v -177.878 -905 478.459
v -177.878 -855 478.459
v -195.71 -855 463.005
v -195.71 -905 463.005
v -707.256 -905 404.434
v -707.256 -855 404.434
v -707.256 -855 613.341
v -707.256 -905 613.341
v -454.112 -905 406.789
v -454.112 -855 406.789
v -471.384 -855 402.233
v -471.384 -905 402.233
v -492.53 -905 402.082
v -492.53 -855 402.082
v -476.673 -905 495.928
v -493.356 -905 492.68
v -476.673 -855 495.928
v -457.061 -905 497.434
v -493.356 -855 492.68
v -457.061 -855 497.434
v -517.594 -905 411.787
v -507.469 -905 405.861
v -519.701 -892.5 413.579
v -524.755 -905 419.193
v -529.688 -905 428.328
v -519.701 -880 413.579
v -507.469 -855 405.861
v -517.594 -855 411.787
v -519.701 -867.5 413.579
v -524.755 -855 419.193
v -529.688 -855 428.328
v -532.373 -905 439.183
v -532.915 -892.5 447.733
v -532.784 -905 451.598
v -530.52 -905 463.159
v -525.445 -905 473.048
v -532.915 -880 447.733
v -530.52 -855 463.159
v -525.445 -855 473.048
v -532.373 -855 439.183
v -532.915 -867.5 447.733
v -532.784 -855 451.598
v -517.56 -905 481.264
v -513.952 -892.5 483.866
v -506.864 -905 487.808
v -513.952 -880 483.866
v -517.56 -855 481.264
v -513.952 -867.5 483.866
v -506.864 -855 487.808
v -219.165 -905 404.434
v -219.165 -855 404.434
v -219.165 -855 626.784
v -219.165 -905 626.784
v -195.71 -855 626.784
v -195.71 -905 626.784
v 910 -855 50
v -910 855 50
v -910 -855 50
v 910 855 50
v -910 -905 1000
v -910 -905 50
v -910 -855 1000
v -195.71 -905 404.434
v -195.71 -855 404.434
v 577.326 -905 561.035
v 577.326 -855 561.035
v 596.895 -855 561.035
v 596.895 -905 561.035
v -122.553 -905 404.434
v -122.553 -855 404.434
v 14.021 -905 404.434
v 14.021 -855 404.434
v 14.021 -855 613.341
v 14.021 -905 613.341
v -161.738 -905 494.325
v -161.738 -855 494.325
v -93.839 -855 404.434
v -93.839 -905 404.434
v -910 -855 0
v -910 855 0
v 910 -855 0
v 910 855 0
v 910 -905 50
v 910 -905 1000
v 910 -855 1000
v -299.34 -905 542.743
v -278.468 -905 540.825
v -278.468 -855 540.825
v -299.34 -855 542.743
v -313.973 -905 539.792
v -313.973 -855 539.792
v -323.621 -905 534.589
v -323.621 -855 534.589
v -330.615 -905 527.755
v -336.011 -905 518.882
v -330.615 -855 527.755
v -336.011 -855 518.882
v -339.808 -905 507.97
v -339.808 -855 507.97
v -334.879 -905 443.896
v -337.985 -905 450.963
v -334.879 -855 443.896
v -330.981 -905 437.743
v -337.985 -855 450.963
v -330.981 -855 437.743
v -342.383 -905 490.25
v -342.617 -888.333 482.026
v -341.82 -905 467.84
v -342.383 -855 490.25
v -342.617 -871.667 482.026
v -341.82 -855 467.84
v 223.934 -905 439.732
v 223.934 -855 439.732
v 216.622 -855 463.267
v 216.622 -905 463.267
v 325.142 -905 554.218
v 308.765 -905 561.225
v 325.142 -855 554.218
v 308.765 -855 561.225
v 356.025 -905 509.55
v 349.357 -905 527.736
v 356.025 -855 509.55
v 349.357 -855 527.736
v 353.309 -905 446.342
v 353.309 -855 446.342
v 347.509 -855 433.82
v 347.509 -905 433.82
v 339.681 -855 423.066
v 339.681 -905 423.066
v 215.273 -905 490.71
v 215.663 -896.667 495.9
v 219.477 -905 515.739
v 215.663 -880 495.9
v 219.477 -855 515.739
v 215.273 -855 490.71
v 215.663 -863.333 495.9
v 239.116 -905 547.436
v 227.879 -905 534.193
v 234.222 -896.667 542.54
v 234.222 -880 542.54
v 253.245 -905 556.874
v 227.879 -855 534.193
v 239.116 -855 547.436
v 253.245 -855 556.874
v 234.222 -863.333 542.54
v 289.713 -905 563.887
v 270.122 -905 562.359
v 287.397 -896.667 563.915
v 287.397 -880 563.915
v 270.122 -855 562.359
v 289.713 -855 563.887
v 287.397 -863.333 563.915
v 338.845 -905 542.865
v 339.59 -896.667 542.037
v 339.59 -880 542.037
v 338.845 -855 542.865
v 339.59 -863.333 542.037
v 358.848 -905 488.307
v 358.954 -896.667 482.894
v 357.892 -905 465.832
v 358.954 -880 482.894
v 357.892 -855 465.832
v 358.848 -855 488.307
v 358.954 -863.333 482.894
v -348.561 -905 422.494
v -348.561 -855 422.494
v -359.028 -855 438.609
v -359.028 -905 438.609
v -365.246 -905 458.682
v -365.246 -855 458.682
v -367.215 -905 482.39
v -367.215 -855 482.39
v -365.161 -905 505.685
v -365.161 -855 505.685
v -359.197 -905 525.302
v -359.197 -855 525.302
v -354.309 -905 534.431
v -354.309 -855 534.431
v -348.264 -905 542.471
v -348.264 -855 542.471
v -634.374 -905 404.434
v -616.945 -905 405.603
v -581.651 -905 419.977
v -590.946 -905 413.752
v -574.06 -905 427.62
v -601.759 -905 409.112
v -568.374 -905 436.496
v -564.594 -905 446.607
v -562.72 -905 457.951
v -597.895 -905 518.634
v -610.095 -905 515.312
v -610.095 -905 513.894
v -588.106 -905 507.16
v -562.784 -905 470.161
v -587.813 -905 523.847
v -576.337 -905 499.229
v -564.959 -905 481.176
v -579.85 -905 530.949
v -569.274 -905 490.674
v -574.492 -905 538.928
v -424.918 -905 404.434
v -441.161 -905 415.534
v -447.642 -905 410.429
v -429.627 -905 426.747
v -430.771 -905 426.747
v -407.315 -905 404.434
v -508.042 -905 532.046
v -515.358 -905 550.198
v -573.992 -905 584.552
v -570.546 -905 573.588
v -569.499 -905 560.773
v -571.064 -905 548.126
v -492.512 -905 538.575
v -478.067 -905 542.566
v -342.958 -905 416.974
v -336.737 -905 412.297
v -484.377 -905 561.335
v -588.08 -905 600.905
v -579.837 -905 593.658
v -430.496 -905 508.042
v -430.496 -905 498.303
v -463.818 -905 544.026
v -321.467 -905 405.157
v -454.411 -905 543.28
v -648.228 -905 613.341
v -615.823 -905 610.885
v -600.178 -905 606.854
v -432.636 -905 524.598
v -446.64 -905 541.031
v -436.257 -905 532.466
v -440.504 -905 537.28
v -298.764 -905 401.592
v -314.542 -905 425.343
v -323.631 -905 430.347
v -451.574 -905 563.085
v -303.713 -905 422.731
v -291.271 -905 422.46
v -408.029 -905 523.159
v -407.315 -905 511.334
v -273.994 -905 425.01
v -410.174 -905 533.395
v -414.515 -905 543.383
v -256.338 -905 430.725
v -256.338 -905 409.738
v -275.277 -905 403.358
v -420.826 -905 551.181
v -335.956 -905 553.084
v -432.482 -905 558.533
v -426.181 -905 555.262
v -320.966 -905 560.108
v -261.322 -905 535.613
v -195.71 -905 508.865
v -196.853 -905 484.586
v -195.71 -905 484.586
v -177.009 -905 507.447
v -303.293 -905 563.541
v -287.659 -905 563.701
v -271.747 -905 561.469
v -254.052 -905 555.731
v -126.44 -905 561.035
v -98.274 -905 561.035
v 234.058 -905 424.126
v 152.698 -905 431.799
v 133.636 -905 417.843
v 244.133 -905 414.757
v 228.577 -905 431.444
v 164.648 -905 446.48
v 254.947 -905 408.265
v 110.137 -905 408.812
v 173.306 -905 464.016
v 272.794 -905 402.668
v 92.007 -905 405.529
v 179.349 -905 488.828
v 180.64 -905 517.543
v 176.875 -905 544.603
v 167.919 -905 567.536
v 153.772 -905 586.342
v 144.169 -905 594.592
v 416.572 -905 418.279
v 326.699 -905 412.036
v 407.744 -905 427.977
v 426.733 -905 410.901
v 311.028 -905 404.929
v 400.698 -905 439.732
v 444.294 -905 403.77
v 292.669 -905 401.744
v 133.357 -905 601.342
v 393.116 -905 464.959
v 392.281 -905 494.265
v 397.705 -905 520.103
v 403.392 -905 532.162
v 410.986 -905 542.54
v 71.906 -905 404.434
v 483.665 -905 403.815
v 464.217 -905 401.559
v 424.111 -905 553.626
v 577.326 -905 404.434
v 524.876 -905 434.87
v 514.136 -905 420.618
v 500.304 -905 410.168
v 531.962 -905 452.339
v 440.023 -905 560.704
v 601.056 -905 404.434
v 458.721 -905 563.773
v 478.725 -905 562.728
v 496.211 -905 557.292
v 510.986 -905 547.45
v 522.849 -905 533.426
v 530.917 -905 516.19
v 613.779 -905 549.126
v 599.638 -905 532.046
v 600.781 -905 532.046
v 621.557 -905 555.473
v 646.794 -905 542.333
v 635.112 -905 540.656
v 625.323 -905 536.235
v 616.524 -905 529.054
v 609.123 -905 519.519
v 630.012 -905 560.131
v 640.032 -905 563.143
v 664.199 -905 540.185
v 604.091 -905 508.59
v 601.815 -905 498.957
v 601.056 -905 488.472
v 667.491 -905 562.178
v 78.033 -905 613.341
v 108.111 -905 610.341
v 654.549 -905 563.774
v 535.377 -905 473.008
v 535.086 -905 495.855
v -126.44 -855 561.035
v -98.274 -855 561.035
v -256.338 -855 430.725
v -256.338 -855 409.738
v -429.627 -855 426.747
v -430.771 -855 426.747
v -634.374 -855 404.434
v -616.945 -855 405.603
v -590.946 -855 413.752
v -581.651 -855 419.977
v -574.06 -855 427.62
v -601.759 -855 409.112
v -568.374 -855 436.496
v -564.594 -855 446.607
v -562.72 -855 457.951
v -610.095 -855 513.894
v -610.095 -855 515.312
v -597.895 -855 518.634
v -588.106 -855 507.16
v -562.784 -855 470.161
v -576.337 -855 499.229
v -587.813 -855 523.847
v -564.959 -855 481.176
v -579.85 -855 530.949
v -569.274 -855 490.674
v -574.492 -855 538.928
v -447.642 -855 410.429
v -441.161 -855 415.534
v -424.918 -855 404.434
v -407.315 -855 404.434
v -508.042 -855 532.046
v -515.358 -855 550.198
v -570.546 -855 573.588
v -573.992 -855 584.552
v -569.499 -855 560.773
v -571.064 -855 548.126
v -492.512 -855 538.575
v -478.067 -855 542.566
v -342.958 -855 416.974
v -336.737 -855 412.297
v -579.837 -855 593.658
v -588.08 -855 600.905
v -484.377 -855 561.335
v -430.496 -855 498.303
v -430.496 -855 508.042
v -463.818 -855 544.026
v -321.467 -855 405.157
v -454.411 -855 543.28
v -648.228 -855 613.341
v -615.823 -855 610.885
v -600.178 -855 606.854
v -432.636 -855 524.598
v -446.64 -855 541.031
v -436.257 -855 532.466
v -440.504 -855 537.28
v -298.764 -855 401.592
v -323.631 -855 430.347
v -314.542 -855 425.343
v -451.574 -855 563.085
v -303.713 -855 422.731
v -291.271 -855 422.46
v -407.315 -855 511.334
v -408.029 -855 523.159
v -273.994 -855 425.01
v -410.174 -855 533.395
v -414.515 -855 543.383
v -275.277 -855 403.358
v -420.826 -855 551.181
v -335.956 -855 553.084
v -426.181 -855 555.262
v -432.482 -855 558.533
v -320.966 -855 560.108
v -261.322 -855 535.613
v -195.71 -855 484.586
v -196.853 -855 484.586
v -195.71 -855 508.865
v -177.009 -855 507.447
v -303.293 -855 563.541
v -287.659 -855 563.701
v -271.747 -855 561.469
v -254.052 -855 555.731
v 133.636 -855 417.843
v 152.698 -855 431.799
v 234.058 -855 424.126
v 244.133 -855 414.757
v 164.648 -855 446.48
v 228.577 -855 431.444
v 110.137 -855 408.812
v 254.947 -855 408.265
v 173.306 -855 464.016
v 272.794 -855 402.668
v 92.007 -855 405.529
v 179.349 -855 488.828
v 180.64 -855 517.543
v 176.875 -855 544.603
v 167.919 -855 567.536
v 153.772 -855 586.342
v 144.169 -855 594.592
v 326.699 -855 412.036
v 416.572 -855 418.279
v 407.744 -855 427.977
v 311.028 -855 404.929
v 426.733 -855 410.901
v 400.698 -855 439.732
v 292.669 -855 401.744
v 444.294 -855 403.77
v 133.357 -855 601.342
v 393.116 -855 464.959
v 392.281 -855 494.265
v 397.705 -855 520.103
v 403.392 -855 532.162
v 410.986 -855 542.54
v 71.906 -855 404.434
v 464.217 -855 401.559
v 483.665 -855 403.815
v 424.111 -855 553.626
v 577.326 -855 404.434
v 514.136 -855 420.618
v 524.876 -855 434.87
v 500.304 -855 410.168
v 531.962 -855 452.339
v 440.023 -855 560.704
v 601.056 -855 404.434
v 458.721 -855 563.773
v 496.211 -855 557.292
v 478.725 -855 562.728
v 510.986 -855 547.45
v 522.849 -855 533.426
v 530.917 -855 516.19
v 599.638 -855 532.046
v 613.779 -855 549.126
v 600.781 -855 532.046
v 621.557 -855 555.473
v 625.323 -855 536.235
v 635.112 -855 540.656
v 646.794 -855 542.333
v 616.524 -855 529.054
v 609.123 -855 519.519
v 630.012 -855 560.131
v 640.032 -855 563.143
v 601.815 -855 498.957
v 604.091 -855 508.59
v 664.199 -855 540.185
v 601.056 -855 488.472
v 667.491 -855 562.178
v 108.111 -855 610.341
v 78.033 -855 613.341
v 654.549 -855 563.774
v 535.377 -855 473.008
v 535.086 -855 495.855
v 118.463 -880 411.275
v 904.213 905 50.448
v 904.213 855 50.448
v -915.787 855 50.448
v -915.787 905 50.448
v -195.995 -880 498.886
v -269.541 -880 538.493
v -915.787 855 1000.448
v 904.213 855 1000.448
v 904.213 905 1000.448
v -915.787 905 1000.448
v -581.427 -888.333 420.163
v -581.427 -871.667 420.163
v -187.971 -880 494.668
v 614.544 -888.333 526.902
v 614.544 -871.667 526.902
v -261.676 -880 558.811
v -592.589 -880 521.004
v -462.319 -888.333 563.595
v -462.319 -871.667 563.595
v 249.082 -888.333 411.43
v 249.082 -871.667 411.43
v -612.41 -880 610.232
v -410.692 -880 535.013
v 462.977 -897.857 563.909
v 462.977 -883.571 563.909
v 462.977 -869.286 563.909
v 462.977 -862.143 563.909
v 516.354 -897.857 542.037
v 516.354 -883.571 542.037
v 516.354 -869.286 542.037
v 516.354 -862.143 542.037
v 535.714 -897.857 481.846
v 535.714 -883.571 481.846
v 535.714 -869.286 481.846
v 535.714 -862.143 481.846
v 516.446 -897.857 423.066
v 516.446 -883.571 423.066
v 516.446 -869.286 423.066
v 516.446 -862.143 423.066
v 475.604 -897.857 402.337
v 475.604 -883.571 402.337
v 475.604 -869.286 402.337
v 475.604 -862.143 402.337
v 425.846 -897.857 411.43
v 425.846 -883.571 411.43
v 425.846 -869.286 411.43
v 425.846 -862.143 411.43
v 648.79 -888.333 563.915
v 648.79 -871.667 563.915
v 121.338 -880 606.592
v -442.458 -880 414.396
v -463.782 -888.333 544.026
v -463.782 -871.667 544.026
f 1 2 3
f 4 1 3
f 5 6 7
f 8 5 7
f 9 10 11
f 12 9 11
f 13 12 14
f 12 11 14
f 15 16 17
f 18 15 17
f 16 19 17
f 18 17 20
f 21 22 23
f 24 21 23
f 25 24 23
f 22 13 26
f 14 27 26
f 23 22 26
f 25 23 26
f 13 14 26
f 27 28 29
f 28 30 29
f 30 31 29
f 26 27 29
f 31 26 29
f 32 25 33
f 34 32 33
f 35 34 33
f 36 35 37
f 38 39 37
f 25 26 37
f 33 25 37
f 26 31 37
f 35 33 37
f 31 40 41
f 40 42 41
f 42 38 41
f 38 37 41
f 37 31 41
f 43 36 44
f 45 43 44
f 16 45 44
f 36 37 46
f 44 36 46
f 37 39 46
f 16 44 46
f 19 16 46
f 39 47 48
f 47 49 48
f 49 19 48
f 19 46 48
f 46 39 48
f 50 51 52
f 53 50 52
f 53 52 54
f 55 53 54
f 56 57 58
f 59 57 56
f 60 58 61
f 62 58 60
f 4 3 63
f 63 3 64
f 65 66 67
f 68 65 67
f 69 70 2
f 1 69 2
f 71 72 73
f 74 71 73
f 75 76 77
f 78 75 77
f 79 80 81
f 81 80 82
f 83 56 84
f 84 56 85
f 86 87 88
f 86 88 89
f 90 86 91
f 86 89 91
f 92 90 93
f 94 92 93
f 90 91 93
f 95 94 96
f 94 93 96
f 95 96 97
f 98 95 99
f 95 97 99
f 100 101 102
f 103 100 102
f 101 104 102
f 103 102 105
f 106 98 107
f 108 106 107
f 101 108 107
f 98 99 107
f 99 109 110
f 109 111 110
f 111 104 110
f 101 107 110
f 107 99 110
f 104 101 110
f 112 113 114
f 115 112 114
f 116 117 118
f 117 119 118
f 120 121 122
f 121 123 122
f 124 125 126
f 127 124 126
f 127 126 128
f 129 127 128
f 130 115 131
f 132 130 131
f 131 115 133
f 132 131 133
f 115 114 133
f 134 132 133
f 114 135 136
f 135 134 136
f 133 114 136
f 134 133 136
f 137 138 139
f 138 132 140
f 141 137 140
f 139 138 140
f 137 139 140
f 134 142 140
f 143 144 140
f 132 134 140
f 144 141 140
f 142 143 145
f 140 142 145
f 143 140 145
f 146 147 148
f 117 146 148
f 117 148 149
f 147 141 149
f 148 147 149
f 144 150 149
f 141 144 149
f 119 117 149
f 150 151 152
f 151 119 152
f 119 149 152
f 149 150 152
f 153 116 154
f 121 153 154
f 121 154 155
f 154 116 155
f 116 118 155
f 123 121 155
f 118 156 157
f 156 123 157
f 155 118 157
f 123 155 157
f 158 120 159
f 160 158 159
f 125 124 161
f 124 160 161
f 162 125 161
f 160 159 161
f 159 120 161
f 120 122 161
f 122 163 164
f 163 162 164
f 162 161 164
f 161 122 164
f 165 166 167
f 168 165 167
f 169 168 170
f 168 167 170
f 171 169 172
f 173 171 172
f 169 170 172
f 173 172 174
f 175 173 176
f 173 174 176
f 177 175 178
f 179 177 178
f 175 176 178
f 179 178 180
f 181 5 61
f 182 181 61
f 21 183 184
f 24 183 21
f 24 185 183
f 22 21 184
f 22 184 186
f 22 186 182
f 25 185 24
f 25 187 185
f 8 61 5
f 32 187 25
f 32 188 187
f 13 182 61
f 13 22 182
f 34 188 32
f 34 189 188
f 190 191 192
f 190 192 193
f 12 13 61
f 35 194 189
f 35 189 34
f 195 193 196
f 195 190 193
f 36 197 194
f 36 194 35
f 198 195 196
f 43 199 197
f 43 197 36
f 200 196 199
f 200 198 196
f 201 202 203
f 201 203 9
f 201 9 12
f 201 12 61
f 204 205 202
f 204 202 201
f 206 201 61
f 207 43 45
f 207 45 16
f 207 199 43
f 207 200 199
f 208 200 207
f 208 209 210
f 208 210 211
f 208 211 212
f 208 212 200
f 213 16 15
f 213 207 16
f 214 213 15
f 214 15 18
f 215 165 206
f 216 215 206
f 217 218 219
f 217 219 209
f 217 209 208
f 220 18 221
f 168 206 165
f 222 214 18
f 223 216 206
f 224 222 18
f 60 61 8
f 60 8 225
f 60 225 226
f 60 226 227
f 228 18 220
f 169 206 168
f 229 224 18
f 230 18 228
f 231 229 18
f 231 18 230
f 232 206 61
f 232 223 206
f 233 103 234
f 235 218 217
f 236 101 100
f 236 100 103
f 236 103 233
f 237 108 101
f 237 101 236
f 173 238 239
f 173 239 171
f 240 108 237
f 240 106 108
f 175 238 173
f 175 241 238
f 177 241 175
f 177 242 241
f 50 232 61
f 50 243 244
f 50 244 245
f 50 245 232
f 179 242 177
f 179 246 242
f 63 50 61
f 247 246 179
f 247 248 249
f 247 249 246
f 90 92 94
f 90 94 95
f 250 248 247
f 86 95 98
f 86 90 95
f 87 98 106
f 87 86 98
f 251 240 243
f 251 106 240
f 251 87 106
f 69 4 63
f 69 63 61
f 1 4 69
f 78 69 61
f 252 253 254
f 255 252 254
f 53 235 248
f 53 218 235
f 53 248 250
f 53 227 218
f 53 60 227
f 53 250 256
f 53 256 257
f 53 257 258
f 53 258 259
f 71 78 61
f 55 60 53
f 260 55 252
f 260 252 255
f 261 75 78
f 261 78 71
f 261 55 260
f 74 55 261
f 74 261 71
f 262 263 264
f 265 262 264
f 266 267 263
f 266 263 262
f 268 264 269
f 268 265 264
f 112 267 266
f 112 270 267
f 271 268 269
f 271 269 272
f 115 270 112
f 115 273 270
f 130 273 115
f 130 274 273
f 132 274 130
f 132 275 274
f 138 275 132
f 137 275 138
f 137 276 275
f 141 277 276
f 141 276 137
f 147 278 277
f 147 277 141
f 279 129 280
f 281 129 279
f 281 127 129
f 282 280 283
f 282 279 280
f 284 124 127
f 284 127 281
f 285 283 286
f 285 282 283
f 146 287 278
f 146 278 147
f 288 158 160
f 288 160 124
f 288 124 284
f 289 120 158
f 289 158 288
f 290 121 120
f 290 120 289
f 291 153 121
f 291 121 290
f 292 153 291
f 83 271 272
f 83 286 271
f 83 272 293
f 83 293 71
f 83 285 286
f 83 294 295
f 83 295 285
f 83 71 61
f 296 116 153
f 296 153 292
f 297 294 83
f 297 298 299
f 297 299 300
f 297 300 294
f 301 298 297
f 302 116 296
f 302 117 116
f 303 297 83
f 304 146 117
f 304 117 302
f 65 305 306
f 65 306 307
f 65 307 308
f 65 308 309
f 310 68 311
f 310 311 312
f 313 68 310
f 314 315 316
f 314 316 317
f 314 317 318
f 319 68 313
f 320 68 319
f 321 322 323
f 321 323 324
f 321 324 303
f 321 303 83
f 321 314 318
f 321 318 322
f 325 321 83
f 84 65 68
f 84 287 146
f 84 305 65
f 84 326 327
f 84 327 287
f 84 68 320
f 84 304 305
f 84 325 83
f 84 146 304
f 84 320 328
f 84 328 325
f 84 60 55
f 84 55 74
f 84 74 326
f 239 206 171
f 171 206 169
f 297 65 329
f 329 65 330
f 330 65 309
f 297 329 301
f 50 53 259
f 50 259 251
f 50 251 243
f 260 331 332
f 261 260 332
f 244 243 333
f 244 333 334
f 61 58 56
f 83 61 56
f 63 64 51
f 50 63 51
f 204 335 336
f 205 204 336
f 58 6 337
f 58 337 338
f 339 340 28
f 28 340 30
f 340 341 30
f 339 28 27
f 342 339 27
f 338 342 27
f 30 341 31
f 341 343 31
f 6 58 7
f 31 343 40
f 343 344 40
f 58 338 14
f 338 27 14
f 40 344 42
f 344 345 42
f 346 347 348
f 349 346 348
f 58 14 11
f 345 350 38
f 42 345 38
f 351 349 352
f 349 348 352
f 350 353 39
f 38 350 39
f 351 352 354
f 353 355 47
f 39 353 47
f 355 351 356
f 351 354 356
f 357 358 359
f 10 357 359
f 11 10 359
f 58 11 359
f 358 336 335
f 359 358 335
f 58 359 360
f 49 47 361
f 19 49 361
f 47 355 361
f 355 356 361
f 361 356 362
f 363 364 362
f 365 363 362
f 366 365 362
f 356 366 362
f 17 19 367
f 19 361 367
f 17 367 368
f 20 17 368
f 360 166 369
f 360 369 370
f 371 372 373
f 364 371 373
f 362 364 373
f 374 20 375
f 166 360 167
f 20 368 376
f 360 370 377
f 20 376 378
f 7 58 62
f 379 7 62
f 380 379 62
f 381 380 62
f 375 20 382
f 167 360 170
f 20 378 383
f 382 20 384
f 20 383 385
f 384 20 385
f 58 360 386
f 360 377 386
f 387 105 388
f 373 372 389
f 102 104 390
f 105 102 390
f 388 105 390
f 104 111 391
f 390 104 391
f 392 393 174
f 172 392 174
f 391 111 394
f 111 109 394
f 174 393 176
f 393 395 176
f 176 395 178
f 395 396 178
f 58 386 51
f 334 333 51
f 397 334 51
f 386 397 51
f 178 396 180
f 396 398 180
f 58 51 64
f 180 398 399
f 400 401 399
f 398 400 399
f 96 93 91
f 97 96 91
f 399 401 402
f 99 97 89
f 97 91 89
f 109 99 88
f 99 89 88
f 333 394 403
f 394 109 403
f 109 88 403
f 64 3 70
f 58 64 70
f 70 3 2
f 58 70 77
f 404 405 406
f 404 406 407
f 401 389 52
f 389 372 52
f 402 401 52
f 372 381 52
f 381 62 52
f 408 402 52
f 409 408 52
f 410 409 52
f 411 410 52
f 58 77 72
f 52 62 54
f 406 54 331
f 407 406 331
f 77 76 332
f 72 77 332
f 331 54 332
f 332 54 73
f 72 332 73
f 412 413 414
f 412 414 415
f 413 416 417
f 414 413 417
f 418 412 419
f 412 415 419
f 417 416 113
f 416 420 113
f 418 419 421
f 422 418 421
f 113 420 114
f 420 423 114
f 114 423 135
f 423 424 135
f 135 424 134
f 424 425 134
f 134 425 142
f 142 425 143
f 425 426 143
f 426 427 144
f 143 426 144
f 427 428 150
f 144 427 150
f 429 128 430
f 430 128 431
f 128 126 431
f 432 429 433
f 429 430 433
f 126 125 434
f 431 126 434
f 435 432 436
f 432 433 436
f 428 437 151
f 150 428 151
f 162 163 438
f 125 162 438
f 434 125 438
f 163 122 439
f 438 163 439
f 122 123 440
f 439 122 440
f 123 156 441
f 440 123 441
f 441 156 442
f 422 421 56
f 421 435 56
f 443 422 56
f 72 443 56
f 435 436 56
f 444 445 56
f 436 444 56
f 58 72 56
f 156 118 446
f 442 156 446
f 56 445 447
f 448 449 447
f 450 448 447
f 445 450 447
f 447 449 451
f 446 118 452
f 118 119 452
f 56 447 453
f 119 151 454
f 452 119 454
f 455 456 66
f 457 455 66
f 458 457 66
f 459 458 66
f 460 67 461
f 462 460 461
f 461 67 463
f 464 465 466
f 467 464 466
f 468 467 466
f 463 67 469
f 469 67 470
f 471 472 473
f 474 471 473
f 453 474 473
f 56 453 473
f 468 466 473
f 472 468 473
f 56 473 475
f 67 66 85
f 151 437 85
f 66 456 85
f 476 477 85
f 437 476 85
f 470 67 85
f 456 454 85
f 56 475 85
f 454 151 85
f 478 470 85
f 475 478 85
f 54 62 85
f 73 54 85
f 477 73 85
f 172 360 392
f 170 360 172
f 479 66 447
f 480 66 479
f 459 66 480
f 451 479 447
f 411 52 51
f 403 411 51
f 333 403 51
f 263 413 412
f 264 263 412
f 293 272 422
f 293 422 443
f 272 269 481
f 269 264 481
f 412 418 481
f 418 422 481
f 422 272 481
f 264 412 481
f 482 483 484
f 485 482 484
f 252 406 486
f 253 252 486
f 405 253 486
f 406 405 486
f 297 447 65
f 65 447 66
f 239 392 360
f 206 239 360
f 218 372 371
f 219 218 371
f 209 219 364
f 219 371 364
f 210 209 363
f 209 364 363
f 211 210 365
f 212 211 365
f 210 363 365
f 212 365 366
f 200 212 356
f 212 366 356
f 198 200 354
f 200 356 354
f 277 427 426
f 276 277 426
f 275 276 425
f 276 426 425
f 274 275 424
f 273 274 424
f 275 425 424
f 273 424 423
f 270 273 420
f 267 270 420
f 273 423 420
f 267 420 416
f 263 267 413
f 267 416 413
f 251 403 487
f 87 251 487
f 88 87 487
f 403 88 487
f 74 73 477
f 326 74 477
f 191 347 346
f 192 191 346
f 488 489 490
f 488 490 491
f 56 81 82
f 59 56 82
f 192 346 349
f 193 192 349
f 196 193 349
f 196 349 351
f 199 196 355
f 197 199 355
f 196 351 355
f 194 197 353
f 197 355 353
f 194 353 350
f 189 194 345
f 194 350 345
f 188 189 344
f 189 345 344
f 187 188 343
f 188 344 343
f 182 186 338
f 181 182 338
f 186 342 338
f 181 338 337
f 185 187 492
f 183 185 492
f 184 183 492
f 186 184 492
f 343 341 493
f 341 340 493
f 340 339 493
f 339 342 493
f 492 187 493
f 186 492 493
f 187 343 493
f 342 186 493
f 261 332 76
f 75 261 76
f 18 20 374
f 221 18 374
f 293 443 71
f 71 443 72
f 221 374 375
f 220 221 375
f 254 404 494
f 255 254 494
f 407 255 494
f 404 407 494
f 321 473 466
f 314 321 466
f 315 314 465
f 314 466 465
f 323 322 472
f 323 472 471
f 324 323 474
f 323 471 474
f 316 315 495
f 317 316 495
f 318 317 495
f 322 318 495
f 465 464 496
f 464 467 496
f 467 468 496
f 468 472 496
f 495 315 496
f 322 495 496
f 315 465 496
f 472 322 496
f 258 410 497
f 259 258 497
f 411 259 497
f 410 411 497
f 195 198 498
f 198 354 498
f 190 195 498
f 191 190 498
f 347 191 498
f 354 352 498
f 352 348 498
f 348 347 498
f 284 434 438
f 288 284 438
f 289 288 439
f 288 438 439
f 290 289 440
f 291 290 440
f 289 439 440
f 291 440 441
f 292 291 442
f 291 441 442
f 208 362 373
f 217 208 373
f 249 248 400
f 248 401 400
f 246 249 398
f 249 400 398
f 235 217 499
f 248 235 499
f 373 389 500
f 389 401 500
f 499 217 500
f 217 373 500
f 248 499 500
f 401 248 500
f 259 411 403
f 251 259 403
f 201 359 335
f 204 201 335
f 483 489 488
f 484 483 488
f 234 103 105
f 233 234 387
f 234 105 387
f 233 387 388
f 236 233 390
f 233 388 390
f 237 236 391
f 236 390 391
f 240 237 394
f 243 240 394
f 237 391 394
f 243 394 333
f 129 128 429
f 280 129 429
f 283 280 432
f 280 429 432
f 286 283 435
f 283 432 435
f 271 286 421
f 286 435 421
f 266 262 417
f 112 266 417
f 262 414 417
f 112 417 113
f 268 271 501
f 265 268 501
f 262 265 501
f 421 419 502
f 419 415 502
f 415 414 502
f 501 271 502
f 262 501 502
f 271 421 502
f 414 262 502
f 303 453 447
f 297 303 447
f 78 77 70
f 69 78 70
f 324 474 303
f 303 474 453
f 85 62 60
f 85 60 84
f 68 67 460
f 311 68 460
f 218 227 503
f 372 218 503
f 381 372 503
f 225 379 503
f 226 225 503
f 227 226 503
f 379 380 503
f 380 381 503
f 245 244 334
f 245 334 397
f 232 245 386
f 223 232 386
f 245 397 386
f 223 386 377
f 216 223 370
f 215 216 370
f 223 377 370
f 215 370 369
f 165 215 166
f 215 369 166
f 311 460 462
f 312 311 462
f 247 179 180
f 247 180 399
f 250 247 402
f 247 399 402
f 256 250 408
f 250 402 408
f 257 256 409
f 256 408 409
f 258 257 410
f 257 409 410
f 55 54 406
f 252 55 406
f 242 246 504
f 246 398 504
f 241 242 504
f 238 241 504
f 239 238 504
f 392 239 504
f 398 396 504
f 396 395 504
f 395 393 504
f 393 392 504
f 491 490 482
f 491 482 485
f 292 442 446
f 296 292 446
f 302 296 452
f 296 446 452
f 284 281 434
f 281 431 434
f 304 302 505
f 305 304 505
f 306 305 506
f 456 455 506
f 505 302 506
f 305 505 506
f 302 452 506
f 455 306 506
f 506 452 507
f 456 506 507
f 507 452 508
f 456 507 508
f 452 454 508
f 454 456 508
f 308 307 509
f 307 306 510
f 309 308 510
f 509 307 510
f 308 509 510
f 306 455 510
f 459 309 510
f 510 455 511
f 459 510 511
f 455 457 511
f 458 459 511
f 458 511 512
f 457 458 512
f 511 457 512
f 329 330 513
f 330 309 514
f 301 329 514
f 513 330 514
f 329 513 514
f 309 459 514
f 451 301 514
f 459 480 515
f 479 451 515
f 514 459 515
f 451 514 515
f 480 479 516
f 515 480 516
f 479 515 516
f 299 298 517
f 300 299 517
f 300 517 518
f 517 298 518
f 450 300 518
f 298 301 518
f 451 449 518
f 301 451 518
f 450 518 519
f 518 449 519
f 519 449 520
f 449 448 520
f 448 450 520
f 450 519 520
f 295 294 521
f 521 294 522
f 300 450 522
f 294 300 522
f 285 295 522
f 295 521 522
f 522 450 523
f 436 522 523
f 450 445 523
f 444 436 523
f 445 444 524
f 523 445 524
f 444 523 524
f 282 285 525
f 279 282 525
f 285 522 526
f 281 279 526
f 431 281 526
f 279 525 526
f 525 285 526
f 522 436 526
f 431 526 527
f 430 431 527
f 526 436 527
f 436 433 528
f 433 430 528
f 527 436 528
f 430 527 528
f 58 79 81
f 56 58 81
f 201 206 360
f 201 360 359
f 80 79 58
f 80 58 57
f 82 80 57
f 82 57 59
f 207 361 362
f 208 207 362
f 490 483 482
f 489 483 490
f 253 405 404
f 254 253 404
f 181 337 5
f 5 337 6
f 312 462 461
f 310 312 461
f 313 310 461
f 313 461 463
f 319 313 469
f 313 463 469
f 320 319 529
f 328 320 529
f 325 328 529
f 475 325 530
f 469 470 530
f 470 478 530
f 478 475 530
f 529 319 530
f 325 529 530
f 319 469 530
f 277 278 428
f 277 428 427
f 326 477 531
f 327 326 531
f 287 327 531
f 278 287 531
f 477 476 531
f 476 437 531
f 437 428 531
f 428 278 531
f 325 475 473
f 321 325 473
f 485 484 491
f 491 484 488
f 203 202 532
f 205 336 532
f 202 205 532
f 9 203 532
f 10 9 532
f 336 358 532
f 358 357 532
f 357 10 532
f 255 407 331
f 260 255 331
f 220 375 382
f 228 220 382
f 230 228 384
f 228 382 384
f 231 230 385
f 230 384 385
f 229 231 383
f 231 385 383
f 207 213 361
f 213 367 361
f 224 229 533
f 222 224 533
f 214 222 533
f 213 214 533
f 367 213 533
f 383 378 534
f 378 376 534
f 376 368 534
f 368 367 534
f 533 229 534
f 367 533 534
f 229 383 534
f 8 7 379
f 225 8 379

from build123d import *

# Parameters (mm, degrees)
F0_W     = 1820
F0_H     = 1710
F1_DEPTH = 50
F2_W     = 1820
F2_H     = 950
F3_DEPTH = 50
F4_W     = 1820
F4_H     = 950
F5_DEPTH = 50


with BuildPart() as f1:
    # F0 (on Top) → F1 (new body)
    with BuildSketch(Plane.XY):
        Rectangle(F0_W, F0_H)
    extrude(amount=F1_DEPTH)


with BuildPart() as f3:
    # F2 (on face) → F3 (new body)
    with BuildSketch(Plane(origin=(0, 855, 0), x_dir=(-1, 0, 0), z_dir=(0, 1, 0))):
        with Locations((5.786948204, 525.4480183125)):
            Rectangle(F2_W, F2_H)
    extrude(amount=F3_DEPTH)


with BuildPart() as f5:
    # F4 (on face) → F5 (new body)
    with BuildSketch(Plane.XZ.offset(855)):
        with Locations((0, 525)):
            Rectangle(F4_W, F4_H)
        with BuildLine():
            Line((-407.3147230471, 404.433965683), (-424.9179973008, 404.433965683))
            Line((-424.9179973008, 404.433965683), (-429.6274446986, 426.7466873344))
            Line((-429.6274446986, 426.7466873344), (-430.7705144553, 426.7466873344))
            add(Edge.make_bspline(
                [(-430.7705144553, 426.7466873344), (-442.4755487643, 412.0239488677), (-454.1119988878, 406.7886893819)],
                knots=[0, 0, 0, 1, 1, 1], degree=2))
            add(Edge.make_bspline(
                [(-454.1119988878, 406.7886893819), (-465.7484490114, 401.553429896), (-483.2145548943, 401.553429896)],
                knots=[0, 0, 0, 1, 1, 1], degree=2))
            add(Edge.make_bspline(
                [(-483.2145548943, 401.553429896), (-506.4874551414, 401.553429896), (-519.7013415293, 413.5785237369)],
                knots=[0, 0, 0, 1, 1, 1], degree=2))
            add(Edge.make_bspline(
                [(-519.7013415293, 413.5785237369), (-532.9152279171, 425.6036175777), (-532.9152279171, 447.7334480681)],
                knots=[0, 0, 0, 1, 1, 1], degree=2))
            add(Edge.make_bspline(
                [(-532.9152279171, 447.7334480681), (-532.9152279171, 495.1479815774), (-457.0611188602, 497.4341210909)],
                knots=[0, 0, 0, 1, 1, 1], degree=2))
            Line((-457.0611188602, 497.4341210909), (-430.4961777137, 498.302854106))
            Line((-430.4961777137, 498.302854106), (-430.4961777137, 508.0418084334))
            add(Edge.make_bspline(
                [(-430.4961777137, 508.0418084334), (-430.4961777137, 526.468092912), (-438.4062204303, 535.2468686437)],
                knots=[0, 0, 0, 1, 1, 1], degree=2))
            add(Edge.make_bspline(
                [(-438.4062204303, 535.2468686437), (-446.3162631469, 544.0256443754), (-463.7823690298, 544.0256443754)],
                knots=[0, 0, 0, 1, 1, 1], degree=2))
            add(Edge.make_bspline(
                [(-463.7823690298, 544.0256443754), (-483.3517232651, 544.0256443754), (-508.0420300106, 532.0462733248)],
                knots=[0, 0, 0, 1, 1, 1], degree=2))
            Line((-508.0420300106, 532.0462733248), (-515.3576764537, 550.1982210618))
            add(Edge.make_bspline(
                [(-515.3576764537, 550.1982210618), (-503.7898105155, 556.4622433287), (-490.0043892493, 560.0286209697)],
                knots=[0, 0, 0, 1, 1, 1], degree=2))
            add(Edge.make_bspline(
                [(-490.0043892493, 560.0286209697), (-476.2189679831, 563.5949986107), (-462.3192397412, 563.5949986107)],
                knots=[0, 0, 0, 1, 1, 1], degree=2))
            add(Edge.make_bspline(
                [(-462.3192397412, 563.5949986107), (-434.3368920963, 563.5949986107), (-420.8258075717, 551.1812610526)],
                knots=[0, 0, 0, 1, 1, 1], degree=2))
            add(Edge.make_bspline(
                [(-420.8258075717, 551.1812610526), (-407.3147230471, 538.7675234944), (-407.3147230471, 511.3338493328)],
                knots=[0, 0, 0, 1, 1, 1], degree=2))
            Line((-407.3147230471, 511.3338493328), (-407.3147230471, 404.433965683))
        make_face(mode=Mode.SUBTRACT)
        with BuildLine():
            add(Edge.make_bspline(
                [(-256.3380695776, 409.7378093542), (-272.02098664, 401.553429896), (-295.8882831606, 401.553429896)],
                knots=[0, 0, 0, 1, 1, 1], degree=2))
            add(Edge.make_bspline(
                [(-295.8882831606, 401.553429896), (-329.906039121, 401.553429896), (-348.560937551, 422.4944678394)],
                knots=[0, 0, 0, 1, 1, 1], degree=2))
            add(Edge.make_bspline(
                [(-348.560937551, 422.4944678394), (-367.2158359809, 443.4355057828), (-367.2158359809, 481.7512040285)],
                knots=[0, 0, 0, 1, 1, 1], degree=2))
            add(Edge.make_bspline(
                [(-367.2158359809, 481.7512040285), (-367.2158359809, 521.0270808699), (-348.2637394142, 542.4710695063)],
                knots=[0, 0, 0, 1, 1, 1], degree=2))
            add(Edge.make_bspline(
                [(-348.2637394142, 542.4710695063), (-329.3116428475, 563.9150581426), (-294.3337082915, 563.9150581426)],
                knots=[0, 0, 0, 1, 1, 1], degree=2))
            add(Edge.make_bspline(
                [(-294.3337082915, 563.9150581426), (-283.0401790949, 563.9150581426), (-271.7466498984, 561.4688888632)],
                knots=[0, 0, 0, 1, 1, 1], degree=2))
            add(Edge.make_bspline(
                [(-271.7466498984, 561.4688888632), (-260.4531207018, 559.0227195838), (-254.0519300641, 555.7306786844)],
                knots=[0, 0, 0, 1, 1, 1], degree=2))
            Line((-254.0519300641, 555.7306786844), (-261.321853717, 535.6126509659))
            add(Edge.make_bspline(
                [(-261.321853717, 535.6126509659), (-269.1861736433, 538.7675234944), (-278.467900068, 540.8250490566)],
                knots=[0, 0, 0, 1, 1, 1], degree=2))
            add(Edge.make_bspline(
                [(-278.467900068, 540.8250490566), (-287.7496264927, 542.8825746187), (-294.8823817747, 542.8825746187)],
                knots=[0, 0, 0, 1, 1, 1], degree=2))
            add(Edge.make_bspline(
                [(-294.8823817747, 542.8825746187), (-342.6169748159, 542.8825746187), (-342.6169748159, 482.0255407701)],
                knots=[0, 0, 0, 1, 1, 1], degree=2))
            add(Edge.make_bspline(
                [(-342.6169748159, 482.0255407701), (-342.6169748159, 453.1744601102), (-330.9805246924, 437.7430183942)],
                knots=[0, 0, 0, 1, 1, 1], degree=2))
            add(Edge.make_bspline(
                [(-330.9805246924, 437.7430183942), (-319.3440745688, 422.3115766783), (-296.4826794341, 422.3115766783)],
                knots=[0, 0, 0, 1, 1, 1], degree=2))
            add(Edge.make_bspline(
                [(-296.4826794341, 422.3115766783), (-276.9133251988, 422.3115766783), (-256.3380695776, 430.7245700879)],
                knots=[0, 0, 0, 1, 1, 1], degree=2))
            Line((-256.3380695776, 430.7245700879), (-256.3380695776, 409.7378093542))
        make_face(mode=Mode.SUBTRACT)
        with BuildLine():
            add(Edge.make_bspline(
                [(339.5899173985, 542.0367029987), (358.9535190776, 520.1583478548), (358.9535190776, 482.8942737853)],
                knots=[0, 0, 0, 1, 1, 1], degree=2))
            add(Edge.make_bspline(
                [(358.9535190776, 482.8942737853), (358.9535190776, 444.5785755395), (339.681362979, 423.0660027178)],
                knots=[0, 0, 0, 1, 1, 1], degree=2))
            add(Edge.make_bspline(
                [(339.681362979, 423.0660027178), (320.4092068805, 401.553429896), (286.39145092, 401.553429896)],
                knots=[0, 0, 0, 1, 1, 1], degree=2))
            add(Edge.make_bspline(
                [(286.39145092, 401.553429896), (265.3589673961, 401.553429896), (249.0816540602, 411.4295525942)],
                knots=[0, 0, 0, 1, 1, 1], degree=2))
            add(Edge.make_bspline(
                [(249.0816540602, 411.4295525942), (232.8043407243, 421.3056752924), (223.9341194121, 439.731959771)],
                knots=[0, 0, 0, 1, 1, 1], degree=2))
            add(Edge.make_bspline(
                [(223.9341194121, 439.731959771), (215.0638980998, 458.1582442495), (215.0638980998, 482.8942737853)],
                knots=[0, 0, 0, 1, 1, 1], degree=2))
            add(Edge.make_bspline(
                [(215.0638980998, 482.8942737853), (215.0638980998, 521.1642492407), (234.2217472227, 542.5396536917)],
                knots=[0, 0, 0, 1, 1, 1], degree=2))
            add(Edge.make_bspline(
                [(234.2217472227, 542.5396536917), (253.3795963455, 563.9150581426), (287.397352306, 563.9150581426)],
                knots=[0, 0, 0, 1, 1, 1], degree=2))
            add(Edge.make_bspline(
                [(287.397352306, 563.9150581426), (320.2263157194, 563.9150581426), (339.5899173985, 542.0367029987)],
                knots=[0, 0, 0, 1, 1, 1], degree=2))
        make_face(mode=Mode.SUBTRACT)
        with BuildLine():
            add(Edge.make_bspline(
                [(516.3542245799, 542.0367029987), (535.717826259, 520.1583478548), (535.717826259, 482.8942737853)],
                knots=[0, 0, 0, 1, 1, 1], degree=2))
            add(Edge.make_bspline(
                [(535.717826259, 482.8942737853), (535.717826259, 444.5785755395), (516.4456701605, 423.0660027178)],
                knots=[0, 0, 0, 1, 1, 1], degree=2))
            add(Edge.make_bspline(
                [(516.4456701605, 423.0660027178), (497.1735140619, 401.553429896), (463.1557581015, 401.553429896)],
                knots=[0, 0, 0, 1, 1, 1], degree=2))
            add(Edge.make_bspline(
                [(463.1557581015, 401.553429896), (442.1232745776, 401.553429896), (425.8459612417, 411.4295525942)],
                knots=[0, 0, 0, 1, 1, 1], degree=2))
            add(Edge.make_bspline(
                [(425.8459612417, 411.4295525942), (409.5686479058, 421.3056752924), (400.6984265935, 439.731959771)],
                knots=[0, 0, 0, 1, 1, 1], degree=2))
            add(Edge.make_bspline(
                [(400.6984265935, 439.731959771), (391.8282052812, 458.1582442495), (391.8282052812, 482.8942737853)],
                knots=[0, 0, 0, 1, 1, 1], degree=2))
            add(Edge.make_bspline(
                [(391.8282052812, 482.8942737853), (391.8282052812, 521.1642492407), (410.9860544041, 542.5396536917)],
                knots=[0, 0, 0, 1, 1, 1], degree=2))
            add(Edge.make_bspline(
                [(410.9860544041, 542.5396536917), (430.143903527, 563.9150581426), (464.1616594874, 563.9150581426)],
                knots=[0, 0, 0, 1, 1, 1], degree=2))
            add(Edge.make_bspline(
                [(464.1616594874, 563.9150581426), (496.9906229008, 563.9150581426), (516.3542245799, 542.0367029987)],
                knots=[0, 0, 0, 1, 1, 1], degree=2))
        make_face(mode=Mode.SUBTRACT)
        with BuildLine():
            add(Edge.make_bspline(
                [(621.768117546, 555.6163717087), (634.0675481285, 563.9150581426), (648.7902865952, 563.9150581426)],
                knots=[0, 0, 0, 1, 1, 1], degree=2))
            add(Edge.make_bspline(
                [(648.7902865952, 563.9150581426), (659.2150827766, 563.9150581426), (667.4909078154, 562.1775921124)],
                knots=[0, 0, 0, 1, 1, 1], degree=2))
            Line((667.4909078154, 562.1775921124), (664.198866916, 540.1849299928))
            add(Edge.make_bspline(
                [(664.198866916, 540.1849299928), (654.5056353789, 542.3339011355), (647.052820565, 542.3339011355)],
                knots=[0, 0, 0, 1, 1, 1], degree=2))
            add(Edge.make_bspline(
                [(647.052820565, 542.3339011355), (628.0321398129, 542.3339011355), (614.5439166834, 526.9024594195)],
                knots=[0, 0, 0, 1, 1, 1], degree=2))
            add(Edge.make_bspline(
                [(614.5439166834, 526.9024594195), (601.055693554, 511.4710177036), (601.055693554, 488.4724541981)],
                knots=[0, 0, 0, 1, 1, 1], degree=2))
            Line((601.055693554, 488.4724541981), (601.055693554, 404.433965683))
            Line((601.055693554, 404.433965683), (577.3255654042, 404.433965683))
            Line((577.3255654042, 404.433965683), (577.3255654042, 561.0345223556))
            Line((577.3255654042, 561.0345223556), (596.8949196395, 561.0345223556))
            Line((596.8949196395, 561.0345223556), (599.6382870556, 532.0462733248))
            Line((599.6382870556, 532.0462733248), (600.7813568124, 532.0462733248))
            add(Edge.make_bspline(
                [(600.7813568124, 532.0462733248), (609.4686869635, 547.3176852748), (621.768117546, 555.6163717087)],
                knots=[0, 0, 0, 1, 1, 1], degree=2))
        make_face(mode=Mode.SUBTRACT)
        with BuildLine():
            Line((-707.2562272143, 404.433965683), (-707.2562272143, 613.3413944238))
            Line((-707.2562272143, 613.3413944238), (-648.2281049765, 613.3413944238))
            add(Edge.make_bspline(
                [(-648.2281049765, 613.3413944238), (-606.6660886216, 613.3413944238), (-588.0797743771, 600.9047954705)],
                knots=[0, 0, 0, 1, 1, 1], degree=2))
            add(Edge.make_bspline(
                [(-588.0797743771, 600.9047954705), (-569.4934601326, 588.4681965173), (-569.4934601326, 561.6289186291)],
                knots=[0, 0, 0, 1, 1, 1], degree=2))
            add(Edge.make_bspline(
                [(-569.4934601326, 561.6289186291), (-569.4934601326, 543.0197429895), (-579.8496721287, 530.9489263584)],
                knots=[0, 0, 0, 1, 1, 1], degree=2))
            add(Edge.make_bspline(
                [(-579.8496721287, 530.9489263584), (-590.2058841247, 518.8781097273), (-610.0952978919, 515.3117320862)],
                knots=[0, 0, 0, 1, 1, 1], degree=2))
            Line((-610.0952978919, 515.3117320862), (-610.0952978919, 513.8943255879))
            add(Edge.make_bspline(
                [(-610.0952978919, 513.8943255879), (-562.4978732214, 505.7556689199), (-562.4978732214, 463.8735930332)],
                knots=[0, 0, 0, 1, 1, 1], degree=2))
            add(Edge.make_bspline(
                [(-562.4978732214, 463.8735930332), (-562.4978732214, 435.8912453883), (-581.4271083929, 420.1626055357)],
                knots=[0, 0, 0, 1, 1, 1], degree=2))
            add(Edge.make_bspline(
                [(-581.4271083929, 420.1626055357), (-600.3563435645, 404.433965683), (-634.3740995249, 404.433965683)],
                knots=[0, 0, 0, 1, 1, 1], degree=2))
            Line((-634.3740995249, 404.433965683), (-707.2562272143, 404.433965683))
        make_face(mode=Mode.SUBTRACT)
        with BuildLine():
            Line((-196.8527194371, 484.5860170252), (-195.7096496804, 484.5860170252))
            add(Edge.make_bspline(
                [(-195.7096496804, 484.5860170252), (-189.5827957843, 493.3190699667), (-177.0090284602, 507.4474121599)],
                knots=[0, 0, 0, 1, 1, 1], degree=2))
            Line((-177.0090284602, 507.4474121599), (-126.4396224223, 561.0345223556))
            Line((-126.4396224223, 561.0345223556), (-98.2743836163, 561.0345223556))
            Line((-98.2743836163, 561.0345223556), (-161.7376165102, 494.3249713526))
            Line((-161.7376165102, 494.3249713526), (-93.8392729602, 404.433965683))
            Line((-93.8392729602, 404.433965683), (-122.5531852494, 404.433965683))
            Line((-122.5531852494, 404.433965683), (-177.8777614753, 478.4591631291))
            Line((-177.8777614753, 478.4591631291), (-195.7096496804, 463.0048600181))
            Line((-195.7096496804, 463.0048600181), (-195.7096496804, 404.433965683))
            Line((-195.7096496804, 404.433965683), (-219.1654410886, 404.433965683))
            Line((-219.1654410886, 404.433965683), (-219.1654410886, 626.783894763))
            Line((-219.1654410886, 626.783894763), (-195.7096496804, 626.783894763))
            Line((-195.7096496804, 626.783894763), (-195.7096496804, 508.8648186583))
            add(Edge.make_bspline(
                [(-195.7096496804, 508.8648186583), (-195.7096496804, 501.0462215222), (-196.8527194371, 484.5860170252)],
                knots=[0, 0, 0, 1, 1, 1], degree=2))
        make_face(mode=Mode.SUBTRACT)
        with BuildLine():
            add(Edge.make_bspline(
                [(153.7724977437, 586.3420867697), (180.7718053978, 559.3427791157), (180.7718053978, 510.8766214301)],
                knots=[0, 0, 0, 1, 1, 1], degree=2))
            add(Edge.make_bspline(
                [(180.7718053978, 510.8766214301), (180.7718053978, 459.1641456354), (152.6980121723, 431.7990556592)],
                knots=[0, 0, 0, 1, 1, 1], degree=2))
            add(Edge.make_bspline(
                [(152.6980121723, 431.7990556592), (124.6242189469, 404.433965683), (71.9058417663, 404.433965683)],
                knots=[0, 0, 0, 1, 1, 1], degree=2))
            Line((71.9058417663, 404.433965683), (14.0207892853, 404.433965683))
            Line((14.0207892853, 404.433965683), (14.0207892853, 613.3413944238))
            Line((14.0207892853, 613.3413944238), (78.0326956624, 613.3413944238))
            add(Edge.make_bspline(
                [(78.0326956624, 613.3413944238), (126.7731900896, 613.3413944238), (153.7724977437, 586.3420867697)],
                knots=[0, 0, 0, 1, 1, 1], degree=2))
        make_face(mode=Mode.SUBTRACT)
    extrude(amount=F5_DEPTH)


solid = Compound([f1.part, f3.part, f5.part])
